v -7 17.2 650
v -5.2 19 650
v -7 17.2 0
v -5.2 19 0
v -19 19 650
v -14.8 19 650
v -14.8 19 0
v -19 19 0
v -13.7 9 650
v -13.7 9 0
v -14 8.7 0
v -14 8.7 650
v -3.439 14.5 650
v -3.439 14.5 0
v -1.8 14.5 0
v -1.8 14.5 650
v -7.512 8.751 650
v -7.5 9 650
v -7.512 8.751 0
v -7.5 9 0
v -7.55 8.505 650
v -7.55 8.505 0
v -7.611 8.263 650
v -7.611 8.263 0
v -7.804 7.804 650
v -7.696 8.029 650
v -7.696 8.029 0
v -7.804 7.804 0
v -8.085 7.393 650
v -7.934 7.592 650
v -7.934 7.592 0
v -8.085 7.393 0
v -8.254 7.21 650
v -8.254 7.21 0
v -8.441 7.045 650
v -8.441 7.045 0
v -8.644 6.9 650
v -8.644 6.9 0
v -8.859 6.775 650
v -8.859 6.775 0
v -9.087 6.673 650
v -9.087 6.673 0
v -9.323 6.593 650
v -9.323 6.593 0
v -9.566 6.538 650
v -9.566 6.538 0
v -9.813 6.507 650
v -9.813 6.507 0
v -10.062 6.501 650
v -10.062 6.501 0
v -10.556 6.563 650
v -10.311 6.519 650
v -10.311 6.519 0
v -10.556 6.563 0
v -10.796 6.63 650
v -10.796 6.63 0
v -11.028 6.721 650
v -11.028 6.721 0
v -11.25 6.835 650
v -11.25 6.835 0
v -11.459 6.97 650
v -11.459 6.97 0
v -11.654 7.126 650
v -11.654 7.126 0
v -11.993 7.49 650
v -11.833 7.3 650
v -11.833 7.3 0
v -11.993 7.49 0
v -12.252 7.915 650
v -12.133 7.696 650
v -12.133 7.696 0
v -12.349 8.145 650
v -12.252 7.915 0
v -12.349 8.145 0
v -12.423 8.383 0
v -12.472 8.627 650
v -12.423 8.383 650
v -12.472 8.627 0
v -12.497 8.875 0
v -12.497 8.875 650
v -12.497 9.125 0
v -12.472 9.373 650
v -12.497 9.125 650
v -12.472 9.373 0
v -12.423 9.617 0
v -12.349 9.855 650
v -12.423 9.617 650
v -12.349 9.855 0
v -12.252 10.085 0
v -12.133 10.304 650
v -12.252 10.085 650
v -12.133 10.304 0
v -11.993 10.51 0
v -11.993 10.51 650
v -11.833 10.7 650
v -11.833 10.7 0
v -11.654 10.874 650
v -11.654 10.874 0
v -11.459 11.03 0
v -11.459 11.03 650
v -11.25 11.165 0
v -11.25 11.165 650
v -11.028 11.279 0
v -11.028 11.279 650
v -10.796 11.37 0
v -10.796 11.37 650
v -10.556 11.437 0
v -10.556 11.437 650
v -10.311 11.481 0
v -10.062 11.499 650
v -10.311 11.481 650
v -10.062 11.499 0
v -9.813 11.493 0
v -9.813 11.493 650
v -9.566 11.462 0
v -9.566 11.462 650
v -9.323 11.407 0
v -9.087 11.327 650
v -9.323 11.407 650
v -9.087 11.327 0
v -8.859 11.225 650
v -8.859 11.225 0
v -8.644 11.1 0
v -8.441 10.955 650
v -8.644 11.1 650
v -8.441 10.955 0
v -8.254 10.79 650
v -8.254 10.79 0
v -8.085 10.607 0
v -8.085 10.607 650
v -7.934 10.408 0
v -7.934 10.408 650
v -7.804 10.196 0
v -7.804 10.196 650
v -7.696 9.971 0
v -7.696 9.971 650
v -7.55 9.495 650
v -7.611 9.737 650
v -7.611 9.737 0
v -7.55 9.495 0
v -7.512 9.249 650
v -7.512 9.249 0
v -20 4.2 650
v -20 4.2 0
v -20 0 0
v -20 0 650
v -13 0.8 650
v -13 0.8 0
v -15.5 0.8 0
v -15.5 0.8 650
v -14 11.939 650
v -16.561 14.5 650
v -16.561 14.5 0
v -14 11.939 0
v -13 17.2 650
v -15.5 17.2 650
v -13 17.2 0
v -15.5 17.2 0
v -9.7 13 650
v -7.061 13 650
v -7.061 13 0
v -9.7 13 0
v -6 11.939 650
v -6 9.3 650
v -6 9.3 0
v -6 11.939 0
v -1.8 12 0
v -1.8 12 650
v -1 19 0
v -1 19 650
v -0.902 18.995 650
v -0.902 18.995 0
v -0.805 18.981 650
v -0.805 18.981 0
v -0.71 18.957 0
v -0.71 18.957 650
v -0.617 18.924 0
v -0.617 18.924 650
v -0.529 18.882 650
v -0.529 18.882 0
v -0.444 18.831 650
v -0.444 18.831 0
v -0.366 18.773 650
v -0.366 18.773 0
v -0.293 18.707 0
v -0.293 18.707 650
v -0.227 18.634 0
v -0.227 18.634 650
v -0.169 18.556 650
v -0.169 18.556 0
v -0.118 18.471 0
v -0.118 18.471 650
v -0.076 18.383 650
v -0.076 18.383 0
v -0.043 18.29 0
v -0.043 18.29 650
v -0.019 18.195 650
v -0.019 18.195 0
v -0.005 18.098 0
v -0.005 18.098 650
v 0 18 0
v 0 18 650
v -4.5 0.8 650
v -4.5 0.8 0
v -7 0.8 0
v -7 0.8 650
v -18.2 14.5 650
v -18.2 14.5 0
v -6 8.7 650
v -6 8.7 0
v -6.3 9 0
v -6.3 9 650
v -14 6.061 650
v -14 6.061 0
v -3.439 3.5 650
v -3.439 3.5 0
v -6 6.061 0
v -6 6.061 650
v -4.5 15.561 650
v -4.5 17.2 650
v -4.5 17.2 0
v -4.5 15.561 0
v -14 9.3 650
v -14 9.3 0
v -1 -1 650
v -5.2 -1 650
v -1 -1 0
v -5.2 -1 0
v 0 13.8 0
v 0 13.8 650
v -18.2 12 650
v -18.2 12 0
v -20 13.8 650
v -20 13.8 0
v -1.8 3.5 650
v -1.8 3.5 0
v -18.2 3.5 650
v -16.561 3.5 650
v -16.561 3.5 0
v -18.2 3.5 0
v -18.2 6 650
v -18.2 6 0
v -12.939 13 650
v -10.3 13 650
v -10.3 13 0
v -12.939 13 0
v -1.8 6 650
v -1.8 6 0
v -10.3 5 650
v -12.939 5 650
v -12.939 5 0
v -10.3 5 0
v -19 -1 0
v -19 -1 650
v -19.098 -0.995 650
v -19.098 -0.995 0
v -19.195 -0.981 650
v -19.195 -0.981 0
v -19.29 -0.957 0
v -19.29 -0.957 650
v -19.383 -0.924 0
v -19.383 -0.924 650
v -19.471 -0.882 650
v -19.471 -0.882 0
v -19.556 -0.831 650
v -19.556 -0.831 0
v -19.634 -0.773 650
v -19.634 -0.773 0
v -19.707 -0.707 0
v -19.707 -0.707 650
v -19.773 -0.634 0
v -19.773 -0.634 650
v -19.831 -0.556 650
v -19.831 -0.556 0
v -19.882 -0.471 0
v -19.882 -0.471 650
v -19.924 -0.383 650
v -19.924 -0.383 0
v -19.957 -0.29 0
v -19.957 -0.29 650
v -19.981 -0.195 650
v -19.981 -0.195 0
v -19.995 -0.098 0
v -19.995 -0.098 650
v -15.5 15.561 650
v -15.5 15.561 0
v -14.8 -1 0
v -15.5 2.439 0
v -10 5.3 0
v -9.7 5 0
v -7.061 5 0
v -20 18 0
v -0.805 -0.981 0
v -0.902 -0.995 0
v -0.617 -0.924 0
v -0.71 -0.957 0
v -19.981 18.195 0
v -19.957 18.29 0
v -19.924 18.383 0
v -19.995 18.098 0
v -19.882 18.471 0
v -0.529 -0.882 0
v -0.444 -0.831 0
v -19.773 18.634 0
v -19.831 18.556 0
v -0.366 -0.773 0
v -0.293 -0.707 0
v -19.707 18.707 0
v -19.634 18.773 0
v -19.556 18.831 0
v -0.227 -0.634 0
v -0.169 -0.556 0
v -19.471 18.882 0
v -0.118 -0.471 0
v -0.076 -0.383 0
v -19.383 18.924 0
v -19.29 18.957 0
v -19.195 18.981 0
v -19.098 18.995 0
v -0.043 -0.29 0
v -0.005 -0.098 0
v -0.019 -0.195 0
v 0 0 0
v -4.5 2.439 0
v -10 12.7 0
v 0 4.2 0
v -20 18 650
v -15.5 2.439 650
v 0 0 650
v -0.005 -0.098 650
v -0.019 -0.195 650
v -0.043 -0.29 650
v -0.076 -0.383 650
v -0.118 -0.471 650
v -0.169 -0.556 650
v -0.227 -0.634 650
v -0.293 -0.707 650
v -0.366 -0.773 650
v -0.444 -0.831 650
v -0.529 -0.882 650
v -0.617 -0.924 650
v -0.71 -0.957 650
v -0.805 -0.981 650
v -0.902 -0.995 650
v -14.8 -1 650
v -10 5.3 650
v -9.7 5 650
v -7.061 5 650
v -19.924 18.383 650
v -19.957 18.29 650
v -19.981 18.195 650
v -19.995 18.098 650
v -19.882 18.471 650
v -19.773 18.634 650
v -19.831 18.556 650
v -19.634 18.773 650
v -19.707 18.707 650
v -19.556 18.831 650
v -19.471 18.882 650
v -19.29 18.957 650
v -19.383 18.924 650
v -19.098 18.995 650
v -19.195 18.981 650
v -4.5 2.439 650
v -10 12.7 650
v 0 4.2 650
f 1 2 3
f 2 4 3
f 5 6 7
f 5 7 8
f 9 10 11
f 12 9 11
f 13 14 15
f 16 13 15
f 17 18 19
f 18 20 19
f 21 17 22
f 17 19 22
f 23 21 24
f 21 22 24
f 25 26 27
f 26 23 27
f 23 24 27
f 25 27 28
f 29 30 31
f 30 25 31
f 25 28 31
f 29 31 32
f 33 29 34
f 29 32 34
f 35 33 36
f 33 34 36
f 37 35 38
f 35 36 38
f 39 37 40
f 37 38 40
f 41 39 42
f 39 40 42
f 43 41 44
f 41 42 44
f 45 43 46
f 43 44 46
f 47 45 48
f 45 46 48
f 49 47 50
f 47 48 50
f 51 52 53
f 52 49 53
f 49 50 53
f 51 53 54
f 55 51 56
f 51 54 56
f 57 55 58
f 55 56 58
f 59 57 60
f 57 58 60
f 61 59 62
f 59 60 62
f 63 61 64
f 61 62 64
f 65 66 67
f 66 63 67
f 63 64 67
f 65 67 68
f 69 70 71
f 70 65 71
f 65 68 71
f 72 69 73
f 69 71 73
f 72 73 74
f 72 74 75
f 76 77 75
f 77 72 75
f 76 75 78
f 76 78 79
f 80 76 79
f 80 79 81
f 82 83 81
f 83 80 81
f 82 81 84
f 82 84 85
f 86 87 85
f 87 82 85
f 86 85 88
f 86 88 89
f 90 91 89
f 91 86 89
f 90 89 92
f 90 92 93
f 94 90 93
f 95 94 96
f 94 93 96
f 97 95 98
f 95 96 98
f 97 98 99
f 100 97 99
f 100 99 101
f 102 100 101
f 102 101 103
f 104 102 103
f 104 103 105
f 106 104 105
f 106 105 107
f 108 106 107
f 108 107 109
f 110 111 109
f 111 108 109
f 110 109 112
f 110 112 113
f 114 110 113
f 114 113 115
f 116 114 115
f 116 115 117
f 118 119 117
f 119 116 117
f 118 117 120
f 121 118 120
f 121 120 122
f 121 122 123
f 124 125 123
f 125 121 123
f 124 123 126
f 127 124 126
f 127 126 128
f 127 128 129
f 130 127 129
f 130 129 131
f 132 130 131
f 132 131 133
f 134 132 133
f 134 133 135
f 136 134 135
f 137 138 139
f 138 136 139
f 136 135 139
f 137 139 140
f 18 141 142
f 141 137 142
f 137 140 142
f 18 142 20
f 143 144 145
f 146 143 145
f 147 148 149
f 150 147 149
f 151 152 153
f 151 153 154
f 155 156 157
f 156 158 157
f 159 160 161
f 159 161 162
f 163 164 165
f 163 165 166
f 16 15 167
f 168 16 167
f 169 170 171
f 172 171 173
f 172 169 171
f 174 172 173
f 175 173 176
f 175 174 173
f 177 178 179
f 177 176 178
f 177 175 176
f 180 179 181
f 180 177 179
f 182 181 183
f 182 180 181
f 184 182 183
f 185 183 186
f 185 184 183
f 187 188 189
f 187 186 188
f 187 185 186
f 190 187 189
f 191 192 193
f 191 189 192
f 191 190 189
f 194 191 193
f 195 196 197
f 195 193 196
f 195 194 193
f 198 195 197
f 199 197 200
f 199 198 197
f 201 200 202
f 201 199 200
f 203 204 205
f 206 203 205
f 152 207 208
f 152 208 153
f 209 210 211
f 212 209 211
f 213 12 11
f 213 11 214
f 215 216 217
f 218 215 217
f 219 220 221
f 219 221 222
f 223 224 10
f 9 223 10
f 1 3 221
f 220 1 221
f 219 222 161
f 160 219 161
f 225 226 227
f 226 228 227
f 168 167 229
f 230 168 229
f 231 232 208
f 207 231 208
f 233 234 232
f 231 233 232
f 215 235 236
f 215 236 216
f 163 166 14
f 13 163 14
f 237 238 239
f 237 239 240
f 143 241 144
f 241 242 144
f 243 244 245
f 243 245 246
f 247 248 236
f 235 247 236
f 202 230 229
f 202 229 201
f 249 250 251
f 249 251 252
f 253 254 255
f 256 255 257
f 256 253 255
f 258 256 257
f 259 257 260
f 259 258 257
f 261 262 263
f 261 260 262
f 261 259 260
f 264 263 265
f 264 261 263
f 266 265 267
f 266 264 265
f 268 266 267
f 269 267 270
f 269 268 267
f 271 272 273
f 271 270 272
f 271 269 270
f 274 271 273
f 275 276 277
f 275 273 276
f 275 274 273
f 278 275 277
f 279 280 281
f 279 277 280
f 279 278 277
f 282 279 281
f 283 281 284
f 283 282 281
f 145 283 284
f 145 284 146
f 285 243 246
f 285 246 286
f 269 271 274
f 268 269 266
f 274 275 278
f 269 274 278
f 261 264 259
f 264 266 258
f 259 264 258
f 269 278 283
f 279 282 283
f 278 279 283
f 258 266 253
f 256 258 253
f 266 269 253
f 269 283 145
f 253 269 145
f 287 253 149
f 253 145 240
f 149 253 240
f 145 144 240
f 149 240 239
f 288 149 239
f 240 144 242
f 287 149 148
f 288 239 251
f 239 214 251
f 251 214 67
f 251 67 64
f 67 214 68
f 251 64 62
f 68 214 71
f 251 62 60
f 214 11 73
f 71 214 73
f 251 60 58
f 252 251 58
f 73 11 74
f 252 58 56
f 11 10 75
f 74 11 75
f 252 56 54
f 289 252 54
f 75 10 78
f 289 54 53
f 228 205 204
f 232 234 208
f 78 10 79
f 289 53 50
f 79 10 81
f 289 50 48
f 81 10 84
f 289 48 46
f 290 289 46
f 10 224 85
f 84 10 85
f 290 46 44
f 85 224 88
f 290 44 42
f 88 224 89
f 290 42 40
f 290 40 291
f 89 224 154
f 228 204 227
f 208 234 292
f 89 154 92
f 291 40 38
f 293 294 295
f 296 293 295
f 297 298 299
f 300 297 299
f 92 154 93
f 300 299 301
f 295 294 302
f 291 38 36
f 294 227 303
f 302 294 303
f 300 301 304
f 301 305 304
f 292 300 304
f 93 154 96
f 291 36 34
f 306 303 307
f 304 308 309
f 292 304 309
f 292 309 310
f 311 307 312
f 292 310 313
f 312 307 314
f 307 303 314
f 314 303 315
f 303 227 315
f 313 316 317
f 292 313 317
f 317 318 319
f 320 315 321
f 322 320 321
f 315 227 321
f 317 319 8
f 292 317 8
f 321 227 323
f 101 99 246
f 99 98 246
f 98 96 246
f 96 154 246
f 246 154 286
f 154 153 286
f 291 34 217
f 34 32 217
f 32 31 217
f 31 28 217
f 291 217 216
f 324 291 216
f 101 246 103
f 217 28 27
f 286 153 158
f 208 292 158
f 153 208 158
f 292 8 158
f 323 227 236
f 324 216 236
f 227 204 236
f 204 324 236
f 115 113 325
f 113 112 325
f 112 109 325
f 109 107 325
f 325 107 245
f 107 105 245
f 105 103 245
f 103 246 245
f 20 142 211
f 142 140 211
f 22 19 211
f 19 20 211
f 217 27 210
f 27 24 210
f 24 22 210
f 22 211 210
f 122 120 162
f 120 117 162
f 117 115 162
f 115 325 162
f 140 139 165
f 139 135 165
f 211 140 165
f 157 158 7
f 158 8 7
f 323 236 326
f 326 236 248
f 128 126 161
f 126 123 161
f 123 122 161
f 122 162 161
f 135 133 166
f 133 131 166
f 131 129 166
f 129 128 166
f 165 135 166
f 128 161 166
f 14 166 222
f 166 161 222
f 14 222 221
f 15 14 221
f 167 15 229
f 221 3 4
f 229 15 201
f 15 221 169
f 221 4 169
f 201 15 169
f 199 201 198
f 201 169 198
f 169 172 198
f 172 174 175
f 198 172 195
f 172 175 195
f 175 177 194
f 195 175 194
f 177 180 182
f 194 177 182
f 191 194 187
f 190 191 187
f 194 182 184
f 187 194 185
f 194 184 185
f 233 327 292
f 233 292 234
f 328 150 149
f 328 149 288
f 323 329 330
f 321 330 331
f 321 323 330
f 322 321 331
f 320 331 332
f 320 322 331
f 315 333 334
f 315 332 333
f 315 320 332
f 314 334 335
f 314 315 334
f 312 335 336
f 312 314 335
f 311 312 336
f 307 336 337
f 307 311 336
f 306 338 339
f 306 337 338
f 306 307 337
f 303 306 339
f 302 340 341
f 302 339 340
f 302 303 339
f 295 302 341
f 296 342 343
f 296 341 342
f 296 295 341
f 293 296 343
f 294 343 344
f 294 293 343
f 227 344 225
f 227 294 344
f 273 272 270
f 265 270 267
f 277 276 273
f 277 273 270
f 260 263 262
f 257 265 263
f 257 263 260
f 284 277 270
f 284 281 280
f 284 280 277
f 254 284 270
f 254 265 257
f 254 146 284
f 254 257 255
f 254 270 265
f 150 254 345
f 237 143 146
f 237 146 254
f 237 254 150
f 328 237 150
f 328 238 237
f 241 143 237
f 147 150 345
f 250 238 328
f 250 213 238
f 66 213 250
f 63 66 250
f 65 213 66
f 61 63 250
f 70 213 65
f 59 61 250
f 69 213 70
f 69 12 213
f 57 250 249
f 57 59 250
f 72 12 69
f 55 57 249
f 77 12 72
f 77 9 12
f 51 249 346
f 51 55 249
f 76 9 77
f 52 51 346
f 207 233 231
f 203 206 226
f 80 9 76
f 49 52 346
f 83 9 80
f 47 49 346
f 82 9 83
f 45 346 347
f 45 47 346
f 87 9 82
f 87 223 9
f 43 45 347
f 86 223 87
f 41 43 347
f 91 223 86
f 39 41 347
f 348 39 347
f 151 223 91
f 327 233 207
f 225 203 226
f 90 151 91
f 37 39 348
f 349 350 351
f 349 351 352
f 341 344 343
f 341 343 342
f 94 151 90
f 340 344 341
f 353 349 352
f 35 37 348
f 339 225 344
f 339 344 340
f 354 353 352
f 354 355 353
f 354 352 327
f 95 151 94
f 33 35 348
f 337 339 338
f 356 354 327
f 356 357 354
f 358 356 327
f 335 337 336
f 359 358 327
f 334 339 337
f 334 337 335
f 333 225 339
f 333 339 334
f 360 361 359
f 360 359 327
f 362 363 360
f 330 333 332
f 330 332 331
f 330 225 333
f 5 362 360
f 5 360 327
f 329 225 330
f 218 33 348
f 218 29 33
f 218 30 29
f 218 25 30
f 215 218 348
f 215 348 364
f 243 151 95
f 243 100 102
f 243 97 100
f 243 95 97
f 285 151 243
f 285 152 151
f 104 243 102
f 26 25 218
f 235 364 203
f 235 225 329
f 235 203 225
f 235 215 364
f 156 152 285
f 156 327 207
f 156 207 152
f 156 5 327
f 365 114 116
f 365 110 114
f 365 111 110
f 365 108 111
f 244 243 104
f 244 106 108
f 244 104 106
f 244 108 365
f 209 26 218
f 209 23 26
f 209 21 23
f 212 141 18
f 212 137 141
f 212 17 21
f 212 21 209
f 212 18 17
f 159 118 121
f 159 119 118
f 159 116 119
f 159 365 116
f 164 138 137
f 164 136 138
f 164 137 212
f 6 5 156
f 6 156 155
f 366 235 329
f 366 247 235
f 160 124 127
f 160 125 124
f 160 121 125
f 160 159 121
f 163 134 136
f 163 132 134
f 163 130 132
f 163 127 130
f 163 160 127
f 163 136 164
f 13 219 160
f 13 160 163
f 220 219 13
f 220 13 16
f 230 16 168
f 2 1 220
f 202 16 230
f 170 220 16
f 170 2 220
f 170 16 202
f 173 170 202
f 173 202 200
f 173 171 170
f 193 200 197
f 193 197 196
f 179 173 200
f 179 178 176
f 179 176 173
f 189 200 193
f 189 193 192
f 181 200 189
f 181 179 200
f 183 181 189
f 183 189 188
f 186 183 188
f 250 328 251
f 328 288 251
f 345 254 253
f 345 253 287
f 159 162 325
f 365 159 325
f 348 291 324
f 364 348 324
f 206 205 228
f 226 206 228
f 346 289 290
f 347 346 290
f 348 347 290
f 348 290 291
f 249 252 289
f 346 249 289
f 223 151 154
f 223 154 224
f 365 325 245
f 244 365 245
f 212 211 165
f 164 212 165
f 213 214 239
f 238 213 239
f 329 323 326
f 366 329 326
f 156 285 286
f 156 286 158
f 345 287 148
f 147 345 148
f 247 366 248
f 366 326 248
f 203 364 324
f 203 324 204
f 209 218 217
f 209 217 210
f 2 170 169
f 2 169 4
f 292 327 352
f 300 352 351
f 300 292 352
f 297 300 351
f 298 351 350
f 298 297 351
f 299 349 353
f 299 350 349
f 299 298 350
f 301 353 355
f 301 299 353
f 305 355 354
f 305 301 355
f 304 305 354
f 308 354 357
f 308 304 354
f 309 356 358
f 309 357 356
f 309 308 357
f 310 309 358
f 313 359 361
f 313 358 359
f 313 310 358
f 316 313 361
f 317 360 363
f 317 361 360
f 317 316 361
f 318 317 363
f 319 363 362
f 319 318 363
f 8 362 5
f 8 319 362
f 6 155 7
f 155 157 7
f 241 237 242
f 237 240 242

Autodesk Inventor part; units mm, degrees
ref_plane "YZ Plane" through (0, 0, 0) normal (1, 0, 0) x (0, 1, 0)
ref_plane "XZ Plane" through (0, 0, 0) normal (0, 1, 0) x (-1, 0, 0)
ref_plane "XY Plane" through (0, 0, 0) normal (0, 0, 1) x (1, 0, 0)
sketch "Sketch1" plane through (0, 0, 0) normal (0, 0, 1) x (1, 0, 0)
  line L0 (-14, 8.7) -> (-14, 6.0607)
  line L1 (-14, 8.7) -> (-14, 6.0607)
  line L2 (-14, 6.0607) -> (-16.5607, 3.5)
  line L3 (-14, 6.0607) -> (-16.5607, 3.5)
  line L4 (-16.5607, 3.5) -> (-18.2, 3.5)
  line L5 (-16.5607, 3.5) -> (-18.2, 3.5)
  line L6 (-18.2, 3.5) -> (-18.2, 6)
  line L7 (-18.2, 3.5) -> (-18.2, 6)
  line L8 (-20, 4.2) -> (-20, 0)
  line L9 (-18.2, 6) -> (-20, 4.2)
  line L10 (-20, 4.2) -> (-20, 0)
  line L11 (-19, -1) -> (-14.8, -1)
  line L12 (-19, -1) -> (-14.8, -1)
  line L13 (-14.8, -1) -> (-13, 0.8)
  line L14 (-14.8, -1) -> (-13, 0.8)
  line L15 (-15.5, 0.8) -> (-15.5, 2.4393)
  line L16 (-13, 0.8) -> (-15.5, 0.8)
  line L17 (-15.5, 0.8) -> (-15.5, 2.4393)
  line L18 (-12.9393, 5) -> (-10.3, 5)
  line L19 (-15.5, 2.4393) -> (-12.9393, 5)
  line L20 (-12.9393, 5) -> (-10.3, 5)
  line L21 (-10, 5.3) -> (-9.7, 5)
  line L22 (-10.3, 5) -> (-10, 5.3)
  line L23 (-13.7, 9) -> (-14, 8.7)
  line L24 (-13.7, 9) -> (-14, 8.7)
  line L25 (-10, 9) -> (-10, 10.0607)
  circle A0 centre (-10, 9) radius 2.5
  arc A1 (-20, 0) -> (-19, -1) centre (-19, 0) ccw
  arc A2 (-20, 0) -> (-19, -1) centre (-19, 0) ccw
  line L26 (-7.0607, 5) -> (-4.5, 2.4393)
  line L27 (-4.5, 2.4393) -> (-4.5, 0.8)
  line L28 (-4.5, 0.8) -> (-7, 0.8)
  line L29 (-7, 0.8) -> (-5.2, -1)
  line L30 (-3.4393, 3.5) -> (-6, 6.0607)
  line L31 (-1.8, 6) -> (-1.8, 3.5)
  line L32 (-1.8, 3.5) -> (-3.4393, 3.5)
  line L33 (0, 4.2) -> (-1.8, 6)
  line L34 (-5.2, -1) -> (-1, -1)
  line L35 (0, 0) -> (0, 4.2)
  arc A3 (-1, -1) -> (0, 0) centre (-1, 0) ccw
  line L36 (-9.7, 5) -> (-7.0607, 5)
  line L37 (-6, 6.0607) -> (-6, 8.7)
  line L38 (-6, 8.7) -> (-6.3, 9)
  line L39 (-10, 5.3) -> (-9.7, 5)
  line L40 (-6, 11.9393) -> (-3.4393, 14.5)
  line L41 (-3.4393, 14.5) -> (-1.8, 14.5)
  line L42 (-1.8, 14.5) -> (-1.8, 12)
  line L43 (-1.8, 12) -> (0, 13.8)
  line L44 (-4.5, 15.5607) -> (-7.0607, 13)
  line L45 (-7, 17.2) -> (-4.5, 17.2)
  line L46 (-4.5, 17.2) -> (-4.5, 15.5607)
  line L47 (-5.2, 19) -> (-7, 17.2)
  line L48 (0, 13.8) -> (0, 18)
  line L49 (-1, 19) -> (-5.2, 19)
  arc A4 (0, 18) -> (-1, 19) centre (-1, 18) ccw
  line L50 (-6, 9.3) -> (-6, 11.9393)
  line L51 (-7.0607, 13) -> (-9.7, 13)
  line L52 (-9.7, 13) -> (-10, 12.7)
  line L53 (-6.3, 9) -> (-6, 9.3)
  line L54 (-12.9393, 13) -> (-15.5, 15.5607)
  line L55 (-15.5, 15.5607) -> (-15.5, 17.2)
  line L56 (-15.5, 17.2) -> (-13, 17.2)
  line L57 (-13, 17.2) -> (-14.8, 19)
  line L58 (-16.5607, 14.5) -> (-14, 11.9393)
  line L59 (-18.2, 12) -> (-18.2, 14.5)
  line L60 (-18.2, 14.5) -> (-16.5607, 14.5)
  line L61 (-20, 13.8) -> (-18.2, 12)
  line L62 (-14.8, 19) -> (-19, 19)
  line L63 (-20, 18) -> (-20, 13.8)
  arc A5 (-19, 19) -> (-20, 18) centre (-19, 18) ccw
  line L64 (-10.3, 13) -> (-12.9393, 13)
  line L65 (-14, 11.9393) -> (-14, 9.3)
  line L66 (-14, 9.3) -> (-13.7, 9)
  line L67 (-10, 12.7) -> (-10.3, 13)
  point P0 (0, 0)
  point P1 (-1, 0)
  point P2 (-1, 18)
  point P3 (-19, 18)
  dimension "d2" = 360
extrude "Extrusion1" add sketch "Sketch1" along normal blind 650
ref_plane "Work Plane1" through (0, 4.2, 650) normal (1, 0, 0) x (0, 0, -1)
properties part number "20x20 aluminum" material "Aluminum 6061"
